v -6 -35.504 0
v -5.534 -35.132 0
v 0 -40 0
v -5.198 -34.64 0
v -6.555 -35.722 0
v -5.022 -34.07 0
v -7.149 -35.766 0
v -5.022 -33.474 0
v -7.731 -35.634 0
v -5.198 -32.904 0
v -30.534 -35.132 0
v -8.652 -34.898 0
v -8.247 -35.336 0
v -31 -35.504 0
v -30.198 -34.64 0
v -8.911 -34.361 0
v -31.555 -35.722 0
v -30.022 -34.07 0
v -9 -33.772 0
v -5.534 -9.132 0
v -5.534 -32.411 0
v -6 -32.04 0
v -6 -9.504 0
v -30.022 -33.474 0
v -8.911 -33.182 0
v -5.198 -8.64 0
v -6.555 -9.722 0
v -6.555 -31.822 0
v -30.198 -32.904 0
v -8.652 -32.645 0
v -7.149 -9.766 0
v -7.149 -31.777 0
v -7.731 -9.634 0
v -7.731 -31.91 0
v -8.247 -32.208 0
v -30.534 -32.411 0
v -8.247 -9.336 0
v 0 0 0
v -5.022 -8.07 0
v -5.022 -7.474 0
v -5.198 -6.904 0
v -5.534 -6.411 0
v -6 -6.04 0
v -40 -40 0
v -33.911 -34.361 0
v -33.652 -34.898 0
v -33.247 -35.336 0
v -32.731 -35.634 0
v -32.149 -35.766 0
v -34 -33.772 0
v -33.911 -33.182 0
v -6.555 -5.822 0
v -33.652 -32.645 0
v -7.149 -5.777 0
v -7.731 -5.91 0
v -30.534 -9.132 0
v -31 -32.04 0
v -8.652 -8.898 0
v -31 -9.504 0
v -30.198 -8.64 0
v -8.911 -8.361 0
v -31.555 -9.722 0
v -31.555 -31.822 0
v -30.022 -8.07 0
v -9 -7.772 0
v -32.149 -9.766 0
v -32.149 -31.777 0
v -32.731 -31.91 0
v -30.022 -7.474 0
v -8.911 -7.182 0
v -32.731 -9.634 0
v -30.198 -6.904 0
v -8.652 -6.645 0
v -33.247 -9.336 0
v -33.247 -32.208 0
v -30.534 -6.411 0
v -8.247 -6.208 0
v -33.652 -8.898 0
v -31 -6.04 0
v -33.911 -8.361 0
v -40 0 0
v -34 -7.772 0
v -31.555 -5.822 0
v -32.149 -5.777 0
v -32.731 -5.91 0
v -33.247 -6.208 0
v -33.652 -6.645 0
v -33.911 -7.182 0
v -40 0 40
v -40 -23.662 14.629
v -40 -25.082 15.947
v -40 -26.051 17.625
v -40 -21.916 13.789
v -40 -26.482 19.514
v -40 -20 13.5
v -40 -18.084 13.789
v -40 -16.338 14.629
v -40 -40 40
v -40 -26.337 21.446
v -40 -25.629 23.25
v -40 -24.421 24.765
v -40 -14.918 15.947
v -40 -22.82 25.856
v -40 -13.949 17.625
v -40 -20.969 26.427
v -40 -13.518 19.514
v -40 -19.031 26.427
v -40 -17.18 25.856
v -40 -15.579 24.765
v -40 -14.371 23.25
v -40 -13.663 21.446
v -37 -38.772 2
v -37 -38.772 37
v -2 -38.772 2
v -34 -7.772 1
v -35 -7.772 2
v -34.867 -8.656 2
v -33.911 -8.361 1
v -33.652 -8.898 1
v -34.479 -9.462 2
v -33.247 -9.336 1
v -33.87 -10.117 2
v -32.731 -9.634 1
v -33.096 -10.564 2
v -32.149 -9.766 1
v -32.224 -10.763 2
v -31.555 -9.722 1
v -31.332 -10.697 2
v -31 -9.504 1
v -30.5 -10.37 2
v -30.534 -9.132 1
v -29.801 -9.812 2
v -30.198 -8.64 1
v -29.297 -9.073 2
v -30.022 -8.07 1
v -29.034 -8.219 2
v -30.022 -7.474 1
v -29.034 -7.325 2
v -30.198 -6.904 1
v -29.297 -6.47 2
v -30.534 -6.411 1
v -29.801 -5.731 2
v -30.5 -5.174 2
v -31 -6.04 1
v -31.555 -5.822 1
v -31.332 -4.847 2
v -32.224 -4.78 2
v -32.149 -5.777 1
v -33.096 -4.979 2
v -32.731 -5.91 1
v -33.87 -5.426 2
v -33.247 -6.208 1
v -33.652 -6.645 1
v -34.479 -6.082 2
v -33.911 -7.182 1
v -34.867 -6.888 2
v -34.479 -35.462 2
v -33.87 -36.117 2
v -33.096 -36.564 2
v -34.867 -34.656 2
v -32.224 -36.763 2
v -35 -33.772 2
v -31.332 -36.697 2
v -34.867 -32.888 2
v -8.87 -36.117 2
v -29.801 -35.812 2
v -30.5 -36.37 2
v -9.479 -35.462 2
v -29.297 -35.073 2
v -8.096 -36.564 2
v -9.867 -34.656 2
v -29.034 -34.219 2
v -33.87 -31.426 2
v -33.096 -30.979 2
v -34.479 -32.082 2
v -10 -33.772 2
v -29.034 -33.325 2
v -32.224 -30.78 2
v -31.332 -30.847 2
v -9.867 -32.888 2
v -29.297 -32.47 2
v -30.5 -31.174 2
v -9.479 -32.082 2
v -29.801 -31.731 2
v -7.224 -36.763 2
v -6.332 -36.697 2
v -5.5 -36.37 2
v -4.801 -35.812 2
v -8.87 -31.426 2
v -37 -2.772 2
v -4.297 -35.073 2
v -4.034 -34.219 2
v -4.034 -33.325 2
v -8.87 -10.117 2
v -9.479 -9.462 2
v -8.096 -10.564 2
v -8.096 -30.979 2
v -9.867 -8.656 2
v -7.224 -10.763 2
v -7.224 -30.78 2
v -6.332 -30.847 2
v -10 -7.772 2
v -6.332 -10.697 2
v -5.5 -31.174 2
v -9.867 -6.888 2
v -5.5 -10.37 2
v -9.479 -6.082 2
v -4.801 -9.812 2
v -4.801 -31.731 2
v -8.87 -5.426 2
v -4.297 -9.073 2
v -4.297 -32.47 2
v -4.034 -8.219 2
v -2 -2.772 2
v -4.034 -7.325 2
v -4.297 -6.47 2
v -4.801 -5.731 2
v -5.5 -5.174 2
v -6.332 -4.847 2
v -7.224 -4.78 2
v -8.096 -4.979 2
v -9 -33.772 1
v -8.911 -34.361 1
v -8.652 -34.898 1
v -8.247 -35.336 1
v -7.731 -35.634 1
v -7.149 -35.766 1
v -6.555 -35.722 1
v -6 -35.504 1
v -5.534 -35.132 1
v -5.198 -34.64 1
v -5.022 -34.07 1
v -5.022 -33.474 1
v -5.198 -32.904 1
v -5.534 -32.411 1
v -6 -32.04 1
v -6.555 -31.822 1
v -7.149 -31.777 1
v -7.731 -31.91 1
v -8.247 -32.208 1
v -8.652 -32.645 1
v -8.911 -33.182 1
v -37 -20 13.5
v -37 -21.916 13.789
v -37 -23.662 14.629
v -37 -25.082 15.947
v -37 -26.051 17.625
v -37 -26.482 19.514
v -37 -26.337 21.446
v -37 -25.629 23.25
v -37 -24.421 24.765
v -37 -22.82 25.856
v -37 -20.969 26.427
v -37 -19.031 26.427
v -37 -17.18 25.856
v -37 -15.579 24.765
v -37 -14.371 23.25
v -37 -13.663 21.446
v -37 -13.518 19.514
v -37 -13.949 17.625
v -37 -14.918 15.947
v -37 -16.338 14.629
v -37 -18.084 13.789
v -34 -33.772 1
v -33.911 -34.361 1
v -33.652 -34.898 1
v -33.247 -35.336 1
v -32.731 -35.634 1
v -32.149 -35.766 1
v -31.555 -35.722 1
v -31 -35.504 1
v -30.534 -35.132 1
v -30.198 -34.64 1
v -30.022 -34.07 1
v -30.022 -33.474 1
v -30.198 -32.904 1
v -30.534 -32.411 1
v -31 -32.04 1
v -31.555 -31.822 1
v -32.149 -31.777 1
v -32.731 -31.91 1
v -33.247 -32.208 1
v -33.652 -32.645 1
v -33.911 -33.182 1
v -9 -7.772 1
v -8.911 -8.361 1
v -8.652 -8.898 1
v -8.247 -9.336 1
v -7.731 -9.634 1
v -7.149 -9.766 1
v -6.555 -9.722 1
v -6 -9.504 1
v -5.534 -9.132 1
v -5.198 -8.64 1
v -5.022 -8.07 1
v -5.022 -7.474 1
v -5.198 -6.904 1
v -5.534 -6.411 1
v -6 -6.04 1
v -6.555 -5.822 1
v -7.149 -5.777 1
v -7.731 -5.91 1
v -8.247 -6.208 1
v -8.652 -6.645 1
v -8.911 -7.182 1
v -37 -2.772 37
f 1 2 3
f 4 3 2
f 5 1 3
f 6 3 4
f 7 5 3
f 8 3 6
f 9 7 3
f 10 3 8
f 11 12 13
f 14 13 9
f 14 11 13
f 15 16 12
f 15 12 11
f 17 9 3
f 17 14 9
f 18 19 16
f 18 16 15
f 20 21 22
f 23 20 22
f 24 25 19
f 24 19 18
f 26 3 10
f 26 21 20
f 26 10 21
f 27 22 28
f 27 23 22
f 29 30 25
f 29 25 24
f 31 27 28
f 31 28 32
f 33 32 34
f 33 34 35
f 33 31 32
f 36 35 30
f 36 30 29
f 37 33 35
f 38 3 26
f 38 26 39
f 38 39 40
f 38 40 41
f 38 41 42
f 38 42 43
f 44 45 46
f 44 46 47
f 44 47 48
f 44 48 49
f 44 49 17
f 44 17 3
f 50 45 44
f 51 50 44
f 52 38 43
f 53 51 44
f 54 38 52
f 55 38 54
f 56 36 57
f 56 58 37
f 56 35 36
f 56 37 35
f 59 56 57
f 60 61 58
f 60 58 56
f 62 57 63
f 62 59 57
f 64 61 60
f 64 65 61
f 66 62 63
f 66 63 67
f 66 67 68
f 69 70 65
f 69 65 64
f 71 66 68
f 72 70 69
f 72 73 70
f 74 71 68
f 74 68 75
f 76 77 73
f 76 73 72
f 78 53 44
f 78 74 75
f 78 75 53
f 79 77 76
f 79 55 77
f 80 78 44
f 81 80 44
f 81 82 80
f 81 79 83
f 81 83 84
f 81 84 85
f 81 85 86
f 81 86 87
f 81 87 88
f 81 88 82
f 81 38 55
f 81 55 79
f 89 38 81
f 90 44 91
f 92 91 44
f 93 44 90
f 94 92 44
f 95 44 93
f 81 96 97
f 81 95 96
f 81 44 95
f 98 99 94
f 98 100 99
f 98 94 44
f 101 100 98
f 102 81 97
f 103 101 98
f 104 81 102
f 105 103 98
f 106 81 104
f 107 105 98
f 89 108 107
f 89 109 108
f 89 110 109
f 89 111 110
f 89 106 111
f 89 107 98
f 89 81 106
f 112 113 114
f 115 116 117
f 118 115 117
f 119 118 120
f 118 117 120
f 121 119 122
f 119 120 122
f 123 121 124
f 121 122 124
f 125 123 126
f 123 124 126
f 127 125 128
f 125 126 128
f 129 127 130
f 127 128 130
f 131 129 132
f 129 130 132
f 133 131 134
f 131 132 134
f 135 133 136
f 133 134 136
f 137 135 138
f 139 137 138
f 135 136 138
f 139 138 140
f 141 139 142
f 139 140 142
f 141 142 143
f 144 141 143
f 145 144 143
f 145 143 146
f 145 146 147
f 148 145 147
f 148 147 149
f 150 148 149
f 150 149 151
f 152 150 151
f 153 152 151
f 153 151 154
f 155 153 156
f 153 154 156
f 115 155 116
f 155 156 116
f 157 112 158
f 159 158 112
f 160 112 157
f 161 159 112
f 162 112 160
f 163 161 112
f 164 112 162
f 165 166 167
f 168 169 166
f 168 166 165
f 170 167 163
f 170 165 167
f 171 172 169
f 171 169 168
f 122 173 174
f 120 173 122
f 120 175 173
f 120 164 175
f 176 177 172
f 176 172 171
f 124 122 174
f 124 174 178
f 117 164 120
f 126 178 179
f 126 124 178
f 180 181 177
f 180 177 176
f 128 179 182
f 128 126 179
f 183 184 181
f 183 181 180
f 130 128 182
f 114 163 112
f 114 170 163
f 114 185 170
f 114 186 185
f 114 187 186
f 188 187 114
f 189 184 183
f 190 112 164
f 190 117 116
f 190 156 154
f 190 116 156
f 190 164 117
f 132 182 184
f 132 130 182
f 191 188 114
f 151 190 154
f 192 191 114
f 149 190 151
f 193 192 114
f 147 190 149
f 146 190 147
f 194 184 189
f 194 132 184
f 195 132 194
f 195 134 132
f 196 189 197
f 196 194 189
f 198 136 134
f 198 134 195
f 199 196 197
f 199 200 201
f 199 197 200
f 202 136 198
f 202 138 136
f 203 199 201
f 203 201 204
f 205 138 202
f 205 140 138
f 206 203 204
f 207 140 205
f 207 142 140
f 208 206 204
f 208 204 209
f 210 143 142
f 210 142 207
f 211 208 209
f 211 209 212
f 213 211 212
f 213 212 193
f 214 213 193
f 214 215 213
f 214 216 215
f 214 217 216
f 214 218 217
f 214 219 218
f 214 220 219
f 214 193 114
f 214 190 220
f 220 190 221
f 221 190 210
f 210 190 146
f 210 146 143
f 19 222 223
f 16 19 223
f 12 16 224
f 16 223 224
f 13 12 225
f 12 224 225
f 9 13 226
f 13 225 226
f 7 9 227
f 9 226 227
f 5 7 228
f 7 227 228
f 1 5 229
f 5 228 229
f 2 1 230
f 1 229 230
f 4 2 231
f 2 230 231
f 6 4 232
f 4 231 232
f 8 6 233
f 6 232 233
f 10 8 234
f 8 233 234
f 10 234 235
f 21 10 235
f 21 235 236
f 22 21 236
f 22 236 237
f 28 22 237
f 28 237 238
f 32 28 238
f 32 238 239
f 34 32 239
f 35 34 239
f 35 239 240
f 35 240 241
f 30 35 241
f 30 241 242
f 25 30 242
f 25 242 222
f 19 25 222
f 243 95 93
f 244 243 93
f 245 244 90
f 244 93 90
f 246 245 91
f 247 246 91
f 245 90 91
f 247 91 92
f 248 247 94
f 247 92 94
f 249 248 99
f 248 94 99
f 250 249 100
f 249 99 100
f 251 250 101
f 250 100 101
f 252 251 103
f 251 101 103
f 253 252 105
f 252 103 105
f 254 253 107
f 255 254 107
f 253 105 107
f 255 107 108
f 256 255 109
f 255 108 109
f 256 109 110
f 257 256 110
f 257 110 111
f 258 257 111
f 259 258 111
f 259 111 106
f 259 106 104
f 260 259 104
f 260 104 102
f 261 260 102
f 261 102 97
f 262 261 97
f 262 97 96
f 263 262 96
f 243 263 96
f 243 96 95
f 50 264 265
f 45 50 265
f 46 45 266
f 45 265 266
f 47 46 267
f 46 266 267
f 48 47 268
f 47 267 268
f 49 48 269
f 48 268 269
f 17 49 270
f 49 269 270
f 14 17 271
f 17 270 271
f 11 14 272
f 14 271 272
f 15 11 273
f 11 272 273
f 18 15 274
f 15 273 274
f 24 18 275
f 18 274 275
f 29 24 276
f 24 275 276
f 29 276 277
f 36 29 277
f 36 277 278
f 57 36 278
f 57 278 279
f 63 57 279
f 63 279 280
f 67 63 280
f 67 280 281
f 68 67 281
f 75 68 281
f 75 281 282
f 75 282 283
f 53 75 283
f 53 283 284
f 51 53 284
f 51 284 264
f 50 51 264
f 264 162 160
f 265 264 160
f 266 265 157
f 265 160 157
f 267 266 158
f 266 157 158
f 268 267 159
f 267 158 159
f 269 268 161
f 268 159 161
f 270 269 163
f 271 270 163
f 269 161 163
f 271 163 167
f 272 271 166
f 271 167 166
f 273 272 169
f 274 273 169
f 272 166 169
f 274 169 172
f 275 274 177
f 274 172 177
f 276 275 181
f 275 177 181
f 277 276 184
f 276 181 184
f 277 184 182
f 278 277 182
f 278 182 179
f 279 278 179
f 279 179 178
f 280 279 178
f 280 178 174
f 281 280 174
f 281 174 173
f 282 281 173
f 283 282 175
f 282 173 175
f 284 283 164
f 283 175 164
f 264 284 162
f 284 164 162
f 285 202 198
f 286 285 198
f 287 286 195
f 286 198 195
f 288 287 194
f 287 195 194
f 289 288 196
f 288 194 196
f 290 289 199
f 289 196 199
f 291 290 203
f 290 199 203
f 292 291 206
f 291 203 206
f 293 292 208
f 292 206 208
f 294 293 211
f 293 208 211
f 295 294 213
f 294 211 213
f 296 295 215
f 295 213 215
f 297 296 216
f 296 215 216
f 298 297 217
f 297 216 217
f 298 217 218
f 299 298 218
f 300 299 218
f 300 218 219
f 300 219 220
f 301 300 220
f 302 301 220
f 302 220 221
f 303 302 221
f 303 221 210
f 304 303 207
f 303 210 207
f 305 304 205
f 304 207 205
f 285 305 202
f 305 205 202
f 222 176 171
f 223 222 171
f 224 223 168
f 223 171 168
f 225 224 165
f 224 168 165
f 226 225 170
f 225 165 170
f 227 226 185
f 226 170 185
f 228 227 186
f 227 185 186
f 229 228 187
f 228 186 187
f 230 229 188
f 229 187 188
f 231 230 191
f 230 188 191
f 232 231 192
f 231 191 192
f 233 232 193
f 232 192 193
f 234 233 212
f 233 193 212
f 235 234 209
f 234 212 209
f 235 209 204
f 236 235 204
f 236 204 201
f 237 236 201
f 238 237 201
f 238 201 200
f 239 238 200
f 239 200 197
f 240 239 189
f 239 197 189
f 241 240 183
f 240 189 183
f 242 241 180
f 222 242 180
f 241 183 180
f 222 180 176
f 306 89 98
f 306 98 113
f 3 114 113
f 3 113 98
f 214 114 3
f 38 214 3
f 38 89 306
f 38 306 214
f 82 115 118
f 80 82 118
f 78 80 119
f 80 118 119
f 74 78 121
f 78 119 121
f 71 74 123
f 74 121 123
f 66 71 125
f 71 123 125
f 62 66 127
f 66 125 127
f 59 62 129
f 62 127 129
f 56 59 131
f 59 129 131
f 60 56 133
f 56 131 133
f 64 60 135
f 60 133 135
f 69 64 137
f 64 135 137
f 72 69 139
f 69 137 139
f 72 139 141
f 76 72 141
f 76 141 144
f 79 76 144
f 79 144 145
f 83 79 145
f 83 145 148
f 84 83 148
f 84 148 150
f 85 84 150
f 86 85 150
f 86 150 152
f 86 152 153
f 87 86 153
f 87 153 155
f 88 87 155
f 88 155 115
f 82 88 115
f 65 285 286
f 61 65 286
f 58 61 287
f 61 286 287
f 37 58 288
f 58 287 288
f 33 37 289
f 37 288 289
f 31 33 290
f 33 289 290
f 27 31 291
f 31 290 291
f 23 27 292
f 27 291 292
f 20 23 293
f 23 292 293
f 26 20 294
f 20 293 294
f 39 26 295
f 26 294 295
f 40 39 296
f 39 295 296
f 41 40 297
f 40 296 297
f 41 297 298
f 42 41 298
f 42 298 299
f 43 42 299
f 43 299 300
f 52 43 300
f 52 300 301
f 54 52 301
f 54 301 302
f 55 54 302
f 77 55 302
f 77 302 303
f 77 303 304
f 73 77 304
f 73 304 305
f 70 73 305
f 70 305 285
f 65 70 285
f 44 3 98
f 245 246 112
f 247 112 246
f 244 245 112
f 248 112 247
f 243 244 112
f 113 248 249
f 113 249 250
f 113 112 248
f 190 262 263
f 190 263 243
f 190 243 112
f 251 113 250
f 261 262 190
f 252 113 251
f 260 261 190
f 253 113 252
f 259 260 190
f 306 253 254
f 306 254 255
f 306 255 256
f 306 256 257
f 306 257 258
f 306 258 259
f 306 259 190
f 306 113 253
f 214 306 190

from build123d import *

# Parameters (mm, degrees)
PAD_DEPTH       = 40
SKETCH001_W     = 37
SKETCH001_H     = 36
POCKET_DEPTH    = 38
SKETCH002_R     = 6.5
POCKET001_DEPTH = 5
SKETCH003_R     = 2
POCKET002_DEPTH = 5
CHAMFER_SIZE    = 1


with BuildPart() as part:
    # Sketch → Pad (new body)
    with BuildSketch(Plane.XZ):
        Polygon((0, 0), (-40, 0), (-40, 40), align=None)
    extrude(amount=PAD_DEPTH)

    # Sketch001 (on DatumPlane) → Pocket (cut)
    with BuildSketch(Plane.XY.offset(40)):
        with Locations((-18.5, -20.771839)):
            Rectangle(SKETCH001_W, SKETCH001_H)
    extrude(amount=-POCKET_DEPTH, mode=Mode.SUBTRACT)

    # Sketch002 (on Face3 of Pocket) → Pocket001 (cut)
    with BuildSketch(Plane(origin=(-40, 0, 0), x_dir=(0, 0, -1), z_dir=(-1, 0, 0))):
        with Locations((-20, 20)):
            Circle(SKETCH002_R)
    extrude(amount=-POCKET001_DEPTH, mode=Mode.SUBTRACT)

    # Sketch003 (on Face9 of Pocket001) → Pocket002 (cut)
    with BuildSketch(Plane(origin=(0, 0, 2), x_dir=(-1, 0, 0), z_dir=(0, 0, 1))):
        with Locations((32, 33.771839)):
            Circle(SKETCH003_R)
        with Locations((7, 7.771839)):
            Circle(SKETCH003_R)
        with Locations((7, 33.771839)):
            Circle(SKETCH003_R)
        with Locations((32, 7.771839)):
            Circle(SKETCH003_R)
    extrude(amount=-POCKET002_DEPTH, mode=Mode.SUBTRACT)

    # Chamfer
    chamfer_edges = [part.edges().sort_by_distance(p)[0] for p in [
        (-30, -33.771839, 2),
        (-30, -7.771839, 2),
        (-5, -7.771839, 2),
        (-5, -33.771839, 2),
    ]]
    chamfer(chamfer_edges, length=CHAMFER_SIZE)


solid = part.part
